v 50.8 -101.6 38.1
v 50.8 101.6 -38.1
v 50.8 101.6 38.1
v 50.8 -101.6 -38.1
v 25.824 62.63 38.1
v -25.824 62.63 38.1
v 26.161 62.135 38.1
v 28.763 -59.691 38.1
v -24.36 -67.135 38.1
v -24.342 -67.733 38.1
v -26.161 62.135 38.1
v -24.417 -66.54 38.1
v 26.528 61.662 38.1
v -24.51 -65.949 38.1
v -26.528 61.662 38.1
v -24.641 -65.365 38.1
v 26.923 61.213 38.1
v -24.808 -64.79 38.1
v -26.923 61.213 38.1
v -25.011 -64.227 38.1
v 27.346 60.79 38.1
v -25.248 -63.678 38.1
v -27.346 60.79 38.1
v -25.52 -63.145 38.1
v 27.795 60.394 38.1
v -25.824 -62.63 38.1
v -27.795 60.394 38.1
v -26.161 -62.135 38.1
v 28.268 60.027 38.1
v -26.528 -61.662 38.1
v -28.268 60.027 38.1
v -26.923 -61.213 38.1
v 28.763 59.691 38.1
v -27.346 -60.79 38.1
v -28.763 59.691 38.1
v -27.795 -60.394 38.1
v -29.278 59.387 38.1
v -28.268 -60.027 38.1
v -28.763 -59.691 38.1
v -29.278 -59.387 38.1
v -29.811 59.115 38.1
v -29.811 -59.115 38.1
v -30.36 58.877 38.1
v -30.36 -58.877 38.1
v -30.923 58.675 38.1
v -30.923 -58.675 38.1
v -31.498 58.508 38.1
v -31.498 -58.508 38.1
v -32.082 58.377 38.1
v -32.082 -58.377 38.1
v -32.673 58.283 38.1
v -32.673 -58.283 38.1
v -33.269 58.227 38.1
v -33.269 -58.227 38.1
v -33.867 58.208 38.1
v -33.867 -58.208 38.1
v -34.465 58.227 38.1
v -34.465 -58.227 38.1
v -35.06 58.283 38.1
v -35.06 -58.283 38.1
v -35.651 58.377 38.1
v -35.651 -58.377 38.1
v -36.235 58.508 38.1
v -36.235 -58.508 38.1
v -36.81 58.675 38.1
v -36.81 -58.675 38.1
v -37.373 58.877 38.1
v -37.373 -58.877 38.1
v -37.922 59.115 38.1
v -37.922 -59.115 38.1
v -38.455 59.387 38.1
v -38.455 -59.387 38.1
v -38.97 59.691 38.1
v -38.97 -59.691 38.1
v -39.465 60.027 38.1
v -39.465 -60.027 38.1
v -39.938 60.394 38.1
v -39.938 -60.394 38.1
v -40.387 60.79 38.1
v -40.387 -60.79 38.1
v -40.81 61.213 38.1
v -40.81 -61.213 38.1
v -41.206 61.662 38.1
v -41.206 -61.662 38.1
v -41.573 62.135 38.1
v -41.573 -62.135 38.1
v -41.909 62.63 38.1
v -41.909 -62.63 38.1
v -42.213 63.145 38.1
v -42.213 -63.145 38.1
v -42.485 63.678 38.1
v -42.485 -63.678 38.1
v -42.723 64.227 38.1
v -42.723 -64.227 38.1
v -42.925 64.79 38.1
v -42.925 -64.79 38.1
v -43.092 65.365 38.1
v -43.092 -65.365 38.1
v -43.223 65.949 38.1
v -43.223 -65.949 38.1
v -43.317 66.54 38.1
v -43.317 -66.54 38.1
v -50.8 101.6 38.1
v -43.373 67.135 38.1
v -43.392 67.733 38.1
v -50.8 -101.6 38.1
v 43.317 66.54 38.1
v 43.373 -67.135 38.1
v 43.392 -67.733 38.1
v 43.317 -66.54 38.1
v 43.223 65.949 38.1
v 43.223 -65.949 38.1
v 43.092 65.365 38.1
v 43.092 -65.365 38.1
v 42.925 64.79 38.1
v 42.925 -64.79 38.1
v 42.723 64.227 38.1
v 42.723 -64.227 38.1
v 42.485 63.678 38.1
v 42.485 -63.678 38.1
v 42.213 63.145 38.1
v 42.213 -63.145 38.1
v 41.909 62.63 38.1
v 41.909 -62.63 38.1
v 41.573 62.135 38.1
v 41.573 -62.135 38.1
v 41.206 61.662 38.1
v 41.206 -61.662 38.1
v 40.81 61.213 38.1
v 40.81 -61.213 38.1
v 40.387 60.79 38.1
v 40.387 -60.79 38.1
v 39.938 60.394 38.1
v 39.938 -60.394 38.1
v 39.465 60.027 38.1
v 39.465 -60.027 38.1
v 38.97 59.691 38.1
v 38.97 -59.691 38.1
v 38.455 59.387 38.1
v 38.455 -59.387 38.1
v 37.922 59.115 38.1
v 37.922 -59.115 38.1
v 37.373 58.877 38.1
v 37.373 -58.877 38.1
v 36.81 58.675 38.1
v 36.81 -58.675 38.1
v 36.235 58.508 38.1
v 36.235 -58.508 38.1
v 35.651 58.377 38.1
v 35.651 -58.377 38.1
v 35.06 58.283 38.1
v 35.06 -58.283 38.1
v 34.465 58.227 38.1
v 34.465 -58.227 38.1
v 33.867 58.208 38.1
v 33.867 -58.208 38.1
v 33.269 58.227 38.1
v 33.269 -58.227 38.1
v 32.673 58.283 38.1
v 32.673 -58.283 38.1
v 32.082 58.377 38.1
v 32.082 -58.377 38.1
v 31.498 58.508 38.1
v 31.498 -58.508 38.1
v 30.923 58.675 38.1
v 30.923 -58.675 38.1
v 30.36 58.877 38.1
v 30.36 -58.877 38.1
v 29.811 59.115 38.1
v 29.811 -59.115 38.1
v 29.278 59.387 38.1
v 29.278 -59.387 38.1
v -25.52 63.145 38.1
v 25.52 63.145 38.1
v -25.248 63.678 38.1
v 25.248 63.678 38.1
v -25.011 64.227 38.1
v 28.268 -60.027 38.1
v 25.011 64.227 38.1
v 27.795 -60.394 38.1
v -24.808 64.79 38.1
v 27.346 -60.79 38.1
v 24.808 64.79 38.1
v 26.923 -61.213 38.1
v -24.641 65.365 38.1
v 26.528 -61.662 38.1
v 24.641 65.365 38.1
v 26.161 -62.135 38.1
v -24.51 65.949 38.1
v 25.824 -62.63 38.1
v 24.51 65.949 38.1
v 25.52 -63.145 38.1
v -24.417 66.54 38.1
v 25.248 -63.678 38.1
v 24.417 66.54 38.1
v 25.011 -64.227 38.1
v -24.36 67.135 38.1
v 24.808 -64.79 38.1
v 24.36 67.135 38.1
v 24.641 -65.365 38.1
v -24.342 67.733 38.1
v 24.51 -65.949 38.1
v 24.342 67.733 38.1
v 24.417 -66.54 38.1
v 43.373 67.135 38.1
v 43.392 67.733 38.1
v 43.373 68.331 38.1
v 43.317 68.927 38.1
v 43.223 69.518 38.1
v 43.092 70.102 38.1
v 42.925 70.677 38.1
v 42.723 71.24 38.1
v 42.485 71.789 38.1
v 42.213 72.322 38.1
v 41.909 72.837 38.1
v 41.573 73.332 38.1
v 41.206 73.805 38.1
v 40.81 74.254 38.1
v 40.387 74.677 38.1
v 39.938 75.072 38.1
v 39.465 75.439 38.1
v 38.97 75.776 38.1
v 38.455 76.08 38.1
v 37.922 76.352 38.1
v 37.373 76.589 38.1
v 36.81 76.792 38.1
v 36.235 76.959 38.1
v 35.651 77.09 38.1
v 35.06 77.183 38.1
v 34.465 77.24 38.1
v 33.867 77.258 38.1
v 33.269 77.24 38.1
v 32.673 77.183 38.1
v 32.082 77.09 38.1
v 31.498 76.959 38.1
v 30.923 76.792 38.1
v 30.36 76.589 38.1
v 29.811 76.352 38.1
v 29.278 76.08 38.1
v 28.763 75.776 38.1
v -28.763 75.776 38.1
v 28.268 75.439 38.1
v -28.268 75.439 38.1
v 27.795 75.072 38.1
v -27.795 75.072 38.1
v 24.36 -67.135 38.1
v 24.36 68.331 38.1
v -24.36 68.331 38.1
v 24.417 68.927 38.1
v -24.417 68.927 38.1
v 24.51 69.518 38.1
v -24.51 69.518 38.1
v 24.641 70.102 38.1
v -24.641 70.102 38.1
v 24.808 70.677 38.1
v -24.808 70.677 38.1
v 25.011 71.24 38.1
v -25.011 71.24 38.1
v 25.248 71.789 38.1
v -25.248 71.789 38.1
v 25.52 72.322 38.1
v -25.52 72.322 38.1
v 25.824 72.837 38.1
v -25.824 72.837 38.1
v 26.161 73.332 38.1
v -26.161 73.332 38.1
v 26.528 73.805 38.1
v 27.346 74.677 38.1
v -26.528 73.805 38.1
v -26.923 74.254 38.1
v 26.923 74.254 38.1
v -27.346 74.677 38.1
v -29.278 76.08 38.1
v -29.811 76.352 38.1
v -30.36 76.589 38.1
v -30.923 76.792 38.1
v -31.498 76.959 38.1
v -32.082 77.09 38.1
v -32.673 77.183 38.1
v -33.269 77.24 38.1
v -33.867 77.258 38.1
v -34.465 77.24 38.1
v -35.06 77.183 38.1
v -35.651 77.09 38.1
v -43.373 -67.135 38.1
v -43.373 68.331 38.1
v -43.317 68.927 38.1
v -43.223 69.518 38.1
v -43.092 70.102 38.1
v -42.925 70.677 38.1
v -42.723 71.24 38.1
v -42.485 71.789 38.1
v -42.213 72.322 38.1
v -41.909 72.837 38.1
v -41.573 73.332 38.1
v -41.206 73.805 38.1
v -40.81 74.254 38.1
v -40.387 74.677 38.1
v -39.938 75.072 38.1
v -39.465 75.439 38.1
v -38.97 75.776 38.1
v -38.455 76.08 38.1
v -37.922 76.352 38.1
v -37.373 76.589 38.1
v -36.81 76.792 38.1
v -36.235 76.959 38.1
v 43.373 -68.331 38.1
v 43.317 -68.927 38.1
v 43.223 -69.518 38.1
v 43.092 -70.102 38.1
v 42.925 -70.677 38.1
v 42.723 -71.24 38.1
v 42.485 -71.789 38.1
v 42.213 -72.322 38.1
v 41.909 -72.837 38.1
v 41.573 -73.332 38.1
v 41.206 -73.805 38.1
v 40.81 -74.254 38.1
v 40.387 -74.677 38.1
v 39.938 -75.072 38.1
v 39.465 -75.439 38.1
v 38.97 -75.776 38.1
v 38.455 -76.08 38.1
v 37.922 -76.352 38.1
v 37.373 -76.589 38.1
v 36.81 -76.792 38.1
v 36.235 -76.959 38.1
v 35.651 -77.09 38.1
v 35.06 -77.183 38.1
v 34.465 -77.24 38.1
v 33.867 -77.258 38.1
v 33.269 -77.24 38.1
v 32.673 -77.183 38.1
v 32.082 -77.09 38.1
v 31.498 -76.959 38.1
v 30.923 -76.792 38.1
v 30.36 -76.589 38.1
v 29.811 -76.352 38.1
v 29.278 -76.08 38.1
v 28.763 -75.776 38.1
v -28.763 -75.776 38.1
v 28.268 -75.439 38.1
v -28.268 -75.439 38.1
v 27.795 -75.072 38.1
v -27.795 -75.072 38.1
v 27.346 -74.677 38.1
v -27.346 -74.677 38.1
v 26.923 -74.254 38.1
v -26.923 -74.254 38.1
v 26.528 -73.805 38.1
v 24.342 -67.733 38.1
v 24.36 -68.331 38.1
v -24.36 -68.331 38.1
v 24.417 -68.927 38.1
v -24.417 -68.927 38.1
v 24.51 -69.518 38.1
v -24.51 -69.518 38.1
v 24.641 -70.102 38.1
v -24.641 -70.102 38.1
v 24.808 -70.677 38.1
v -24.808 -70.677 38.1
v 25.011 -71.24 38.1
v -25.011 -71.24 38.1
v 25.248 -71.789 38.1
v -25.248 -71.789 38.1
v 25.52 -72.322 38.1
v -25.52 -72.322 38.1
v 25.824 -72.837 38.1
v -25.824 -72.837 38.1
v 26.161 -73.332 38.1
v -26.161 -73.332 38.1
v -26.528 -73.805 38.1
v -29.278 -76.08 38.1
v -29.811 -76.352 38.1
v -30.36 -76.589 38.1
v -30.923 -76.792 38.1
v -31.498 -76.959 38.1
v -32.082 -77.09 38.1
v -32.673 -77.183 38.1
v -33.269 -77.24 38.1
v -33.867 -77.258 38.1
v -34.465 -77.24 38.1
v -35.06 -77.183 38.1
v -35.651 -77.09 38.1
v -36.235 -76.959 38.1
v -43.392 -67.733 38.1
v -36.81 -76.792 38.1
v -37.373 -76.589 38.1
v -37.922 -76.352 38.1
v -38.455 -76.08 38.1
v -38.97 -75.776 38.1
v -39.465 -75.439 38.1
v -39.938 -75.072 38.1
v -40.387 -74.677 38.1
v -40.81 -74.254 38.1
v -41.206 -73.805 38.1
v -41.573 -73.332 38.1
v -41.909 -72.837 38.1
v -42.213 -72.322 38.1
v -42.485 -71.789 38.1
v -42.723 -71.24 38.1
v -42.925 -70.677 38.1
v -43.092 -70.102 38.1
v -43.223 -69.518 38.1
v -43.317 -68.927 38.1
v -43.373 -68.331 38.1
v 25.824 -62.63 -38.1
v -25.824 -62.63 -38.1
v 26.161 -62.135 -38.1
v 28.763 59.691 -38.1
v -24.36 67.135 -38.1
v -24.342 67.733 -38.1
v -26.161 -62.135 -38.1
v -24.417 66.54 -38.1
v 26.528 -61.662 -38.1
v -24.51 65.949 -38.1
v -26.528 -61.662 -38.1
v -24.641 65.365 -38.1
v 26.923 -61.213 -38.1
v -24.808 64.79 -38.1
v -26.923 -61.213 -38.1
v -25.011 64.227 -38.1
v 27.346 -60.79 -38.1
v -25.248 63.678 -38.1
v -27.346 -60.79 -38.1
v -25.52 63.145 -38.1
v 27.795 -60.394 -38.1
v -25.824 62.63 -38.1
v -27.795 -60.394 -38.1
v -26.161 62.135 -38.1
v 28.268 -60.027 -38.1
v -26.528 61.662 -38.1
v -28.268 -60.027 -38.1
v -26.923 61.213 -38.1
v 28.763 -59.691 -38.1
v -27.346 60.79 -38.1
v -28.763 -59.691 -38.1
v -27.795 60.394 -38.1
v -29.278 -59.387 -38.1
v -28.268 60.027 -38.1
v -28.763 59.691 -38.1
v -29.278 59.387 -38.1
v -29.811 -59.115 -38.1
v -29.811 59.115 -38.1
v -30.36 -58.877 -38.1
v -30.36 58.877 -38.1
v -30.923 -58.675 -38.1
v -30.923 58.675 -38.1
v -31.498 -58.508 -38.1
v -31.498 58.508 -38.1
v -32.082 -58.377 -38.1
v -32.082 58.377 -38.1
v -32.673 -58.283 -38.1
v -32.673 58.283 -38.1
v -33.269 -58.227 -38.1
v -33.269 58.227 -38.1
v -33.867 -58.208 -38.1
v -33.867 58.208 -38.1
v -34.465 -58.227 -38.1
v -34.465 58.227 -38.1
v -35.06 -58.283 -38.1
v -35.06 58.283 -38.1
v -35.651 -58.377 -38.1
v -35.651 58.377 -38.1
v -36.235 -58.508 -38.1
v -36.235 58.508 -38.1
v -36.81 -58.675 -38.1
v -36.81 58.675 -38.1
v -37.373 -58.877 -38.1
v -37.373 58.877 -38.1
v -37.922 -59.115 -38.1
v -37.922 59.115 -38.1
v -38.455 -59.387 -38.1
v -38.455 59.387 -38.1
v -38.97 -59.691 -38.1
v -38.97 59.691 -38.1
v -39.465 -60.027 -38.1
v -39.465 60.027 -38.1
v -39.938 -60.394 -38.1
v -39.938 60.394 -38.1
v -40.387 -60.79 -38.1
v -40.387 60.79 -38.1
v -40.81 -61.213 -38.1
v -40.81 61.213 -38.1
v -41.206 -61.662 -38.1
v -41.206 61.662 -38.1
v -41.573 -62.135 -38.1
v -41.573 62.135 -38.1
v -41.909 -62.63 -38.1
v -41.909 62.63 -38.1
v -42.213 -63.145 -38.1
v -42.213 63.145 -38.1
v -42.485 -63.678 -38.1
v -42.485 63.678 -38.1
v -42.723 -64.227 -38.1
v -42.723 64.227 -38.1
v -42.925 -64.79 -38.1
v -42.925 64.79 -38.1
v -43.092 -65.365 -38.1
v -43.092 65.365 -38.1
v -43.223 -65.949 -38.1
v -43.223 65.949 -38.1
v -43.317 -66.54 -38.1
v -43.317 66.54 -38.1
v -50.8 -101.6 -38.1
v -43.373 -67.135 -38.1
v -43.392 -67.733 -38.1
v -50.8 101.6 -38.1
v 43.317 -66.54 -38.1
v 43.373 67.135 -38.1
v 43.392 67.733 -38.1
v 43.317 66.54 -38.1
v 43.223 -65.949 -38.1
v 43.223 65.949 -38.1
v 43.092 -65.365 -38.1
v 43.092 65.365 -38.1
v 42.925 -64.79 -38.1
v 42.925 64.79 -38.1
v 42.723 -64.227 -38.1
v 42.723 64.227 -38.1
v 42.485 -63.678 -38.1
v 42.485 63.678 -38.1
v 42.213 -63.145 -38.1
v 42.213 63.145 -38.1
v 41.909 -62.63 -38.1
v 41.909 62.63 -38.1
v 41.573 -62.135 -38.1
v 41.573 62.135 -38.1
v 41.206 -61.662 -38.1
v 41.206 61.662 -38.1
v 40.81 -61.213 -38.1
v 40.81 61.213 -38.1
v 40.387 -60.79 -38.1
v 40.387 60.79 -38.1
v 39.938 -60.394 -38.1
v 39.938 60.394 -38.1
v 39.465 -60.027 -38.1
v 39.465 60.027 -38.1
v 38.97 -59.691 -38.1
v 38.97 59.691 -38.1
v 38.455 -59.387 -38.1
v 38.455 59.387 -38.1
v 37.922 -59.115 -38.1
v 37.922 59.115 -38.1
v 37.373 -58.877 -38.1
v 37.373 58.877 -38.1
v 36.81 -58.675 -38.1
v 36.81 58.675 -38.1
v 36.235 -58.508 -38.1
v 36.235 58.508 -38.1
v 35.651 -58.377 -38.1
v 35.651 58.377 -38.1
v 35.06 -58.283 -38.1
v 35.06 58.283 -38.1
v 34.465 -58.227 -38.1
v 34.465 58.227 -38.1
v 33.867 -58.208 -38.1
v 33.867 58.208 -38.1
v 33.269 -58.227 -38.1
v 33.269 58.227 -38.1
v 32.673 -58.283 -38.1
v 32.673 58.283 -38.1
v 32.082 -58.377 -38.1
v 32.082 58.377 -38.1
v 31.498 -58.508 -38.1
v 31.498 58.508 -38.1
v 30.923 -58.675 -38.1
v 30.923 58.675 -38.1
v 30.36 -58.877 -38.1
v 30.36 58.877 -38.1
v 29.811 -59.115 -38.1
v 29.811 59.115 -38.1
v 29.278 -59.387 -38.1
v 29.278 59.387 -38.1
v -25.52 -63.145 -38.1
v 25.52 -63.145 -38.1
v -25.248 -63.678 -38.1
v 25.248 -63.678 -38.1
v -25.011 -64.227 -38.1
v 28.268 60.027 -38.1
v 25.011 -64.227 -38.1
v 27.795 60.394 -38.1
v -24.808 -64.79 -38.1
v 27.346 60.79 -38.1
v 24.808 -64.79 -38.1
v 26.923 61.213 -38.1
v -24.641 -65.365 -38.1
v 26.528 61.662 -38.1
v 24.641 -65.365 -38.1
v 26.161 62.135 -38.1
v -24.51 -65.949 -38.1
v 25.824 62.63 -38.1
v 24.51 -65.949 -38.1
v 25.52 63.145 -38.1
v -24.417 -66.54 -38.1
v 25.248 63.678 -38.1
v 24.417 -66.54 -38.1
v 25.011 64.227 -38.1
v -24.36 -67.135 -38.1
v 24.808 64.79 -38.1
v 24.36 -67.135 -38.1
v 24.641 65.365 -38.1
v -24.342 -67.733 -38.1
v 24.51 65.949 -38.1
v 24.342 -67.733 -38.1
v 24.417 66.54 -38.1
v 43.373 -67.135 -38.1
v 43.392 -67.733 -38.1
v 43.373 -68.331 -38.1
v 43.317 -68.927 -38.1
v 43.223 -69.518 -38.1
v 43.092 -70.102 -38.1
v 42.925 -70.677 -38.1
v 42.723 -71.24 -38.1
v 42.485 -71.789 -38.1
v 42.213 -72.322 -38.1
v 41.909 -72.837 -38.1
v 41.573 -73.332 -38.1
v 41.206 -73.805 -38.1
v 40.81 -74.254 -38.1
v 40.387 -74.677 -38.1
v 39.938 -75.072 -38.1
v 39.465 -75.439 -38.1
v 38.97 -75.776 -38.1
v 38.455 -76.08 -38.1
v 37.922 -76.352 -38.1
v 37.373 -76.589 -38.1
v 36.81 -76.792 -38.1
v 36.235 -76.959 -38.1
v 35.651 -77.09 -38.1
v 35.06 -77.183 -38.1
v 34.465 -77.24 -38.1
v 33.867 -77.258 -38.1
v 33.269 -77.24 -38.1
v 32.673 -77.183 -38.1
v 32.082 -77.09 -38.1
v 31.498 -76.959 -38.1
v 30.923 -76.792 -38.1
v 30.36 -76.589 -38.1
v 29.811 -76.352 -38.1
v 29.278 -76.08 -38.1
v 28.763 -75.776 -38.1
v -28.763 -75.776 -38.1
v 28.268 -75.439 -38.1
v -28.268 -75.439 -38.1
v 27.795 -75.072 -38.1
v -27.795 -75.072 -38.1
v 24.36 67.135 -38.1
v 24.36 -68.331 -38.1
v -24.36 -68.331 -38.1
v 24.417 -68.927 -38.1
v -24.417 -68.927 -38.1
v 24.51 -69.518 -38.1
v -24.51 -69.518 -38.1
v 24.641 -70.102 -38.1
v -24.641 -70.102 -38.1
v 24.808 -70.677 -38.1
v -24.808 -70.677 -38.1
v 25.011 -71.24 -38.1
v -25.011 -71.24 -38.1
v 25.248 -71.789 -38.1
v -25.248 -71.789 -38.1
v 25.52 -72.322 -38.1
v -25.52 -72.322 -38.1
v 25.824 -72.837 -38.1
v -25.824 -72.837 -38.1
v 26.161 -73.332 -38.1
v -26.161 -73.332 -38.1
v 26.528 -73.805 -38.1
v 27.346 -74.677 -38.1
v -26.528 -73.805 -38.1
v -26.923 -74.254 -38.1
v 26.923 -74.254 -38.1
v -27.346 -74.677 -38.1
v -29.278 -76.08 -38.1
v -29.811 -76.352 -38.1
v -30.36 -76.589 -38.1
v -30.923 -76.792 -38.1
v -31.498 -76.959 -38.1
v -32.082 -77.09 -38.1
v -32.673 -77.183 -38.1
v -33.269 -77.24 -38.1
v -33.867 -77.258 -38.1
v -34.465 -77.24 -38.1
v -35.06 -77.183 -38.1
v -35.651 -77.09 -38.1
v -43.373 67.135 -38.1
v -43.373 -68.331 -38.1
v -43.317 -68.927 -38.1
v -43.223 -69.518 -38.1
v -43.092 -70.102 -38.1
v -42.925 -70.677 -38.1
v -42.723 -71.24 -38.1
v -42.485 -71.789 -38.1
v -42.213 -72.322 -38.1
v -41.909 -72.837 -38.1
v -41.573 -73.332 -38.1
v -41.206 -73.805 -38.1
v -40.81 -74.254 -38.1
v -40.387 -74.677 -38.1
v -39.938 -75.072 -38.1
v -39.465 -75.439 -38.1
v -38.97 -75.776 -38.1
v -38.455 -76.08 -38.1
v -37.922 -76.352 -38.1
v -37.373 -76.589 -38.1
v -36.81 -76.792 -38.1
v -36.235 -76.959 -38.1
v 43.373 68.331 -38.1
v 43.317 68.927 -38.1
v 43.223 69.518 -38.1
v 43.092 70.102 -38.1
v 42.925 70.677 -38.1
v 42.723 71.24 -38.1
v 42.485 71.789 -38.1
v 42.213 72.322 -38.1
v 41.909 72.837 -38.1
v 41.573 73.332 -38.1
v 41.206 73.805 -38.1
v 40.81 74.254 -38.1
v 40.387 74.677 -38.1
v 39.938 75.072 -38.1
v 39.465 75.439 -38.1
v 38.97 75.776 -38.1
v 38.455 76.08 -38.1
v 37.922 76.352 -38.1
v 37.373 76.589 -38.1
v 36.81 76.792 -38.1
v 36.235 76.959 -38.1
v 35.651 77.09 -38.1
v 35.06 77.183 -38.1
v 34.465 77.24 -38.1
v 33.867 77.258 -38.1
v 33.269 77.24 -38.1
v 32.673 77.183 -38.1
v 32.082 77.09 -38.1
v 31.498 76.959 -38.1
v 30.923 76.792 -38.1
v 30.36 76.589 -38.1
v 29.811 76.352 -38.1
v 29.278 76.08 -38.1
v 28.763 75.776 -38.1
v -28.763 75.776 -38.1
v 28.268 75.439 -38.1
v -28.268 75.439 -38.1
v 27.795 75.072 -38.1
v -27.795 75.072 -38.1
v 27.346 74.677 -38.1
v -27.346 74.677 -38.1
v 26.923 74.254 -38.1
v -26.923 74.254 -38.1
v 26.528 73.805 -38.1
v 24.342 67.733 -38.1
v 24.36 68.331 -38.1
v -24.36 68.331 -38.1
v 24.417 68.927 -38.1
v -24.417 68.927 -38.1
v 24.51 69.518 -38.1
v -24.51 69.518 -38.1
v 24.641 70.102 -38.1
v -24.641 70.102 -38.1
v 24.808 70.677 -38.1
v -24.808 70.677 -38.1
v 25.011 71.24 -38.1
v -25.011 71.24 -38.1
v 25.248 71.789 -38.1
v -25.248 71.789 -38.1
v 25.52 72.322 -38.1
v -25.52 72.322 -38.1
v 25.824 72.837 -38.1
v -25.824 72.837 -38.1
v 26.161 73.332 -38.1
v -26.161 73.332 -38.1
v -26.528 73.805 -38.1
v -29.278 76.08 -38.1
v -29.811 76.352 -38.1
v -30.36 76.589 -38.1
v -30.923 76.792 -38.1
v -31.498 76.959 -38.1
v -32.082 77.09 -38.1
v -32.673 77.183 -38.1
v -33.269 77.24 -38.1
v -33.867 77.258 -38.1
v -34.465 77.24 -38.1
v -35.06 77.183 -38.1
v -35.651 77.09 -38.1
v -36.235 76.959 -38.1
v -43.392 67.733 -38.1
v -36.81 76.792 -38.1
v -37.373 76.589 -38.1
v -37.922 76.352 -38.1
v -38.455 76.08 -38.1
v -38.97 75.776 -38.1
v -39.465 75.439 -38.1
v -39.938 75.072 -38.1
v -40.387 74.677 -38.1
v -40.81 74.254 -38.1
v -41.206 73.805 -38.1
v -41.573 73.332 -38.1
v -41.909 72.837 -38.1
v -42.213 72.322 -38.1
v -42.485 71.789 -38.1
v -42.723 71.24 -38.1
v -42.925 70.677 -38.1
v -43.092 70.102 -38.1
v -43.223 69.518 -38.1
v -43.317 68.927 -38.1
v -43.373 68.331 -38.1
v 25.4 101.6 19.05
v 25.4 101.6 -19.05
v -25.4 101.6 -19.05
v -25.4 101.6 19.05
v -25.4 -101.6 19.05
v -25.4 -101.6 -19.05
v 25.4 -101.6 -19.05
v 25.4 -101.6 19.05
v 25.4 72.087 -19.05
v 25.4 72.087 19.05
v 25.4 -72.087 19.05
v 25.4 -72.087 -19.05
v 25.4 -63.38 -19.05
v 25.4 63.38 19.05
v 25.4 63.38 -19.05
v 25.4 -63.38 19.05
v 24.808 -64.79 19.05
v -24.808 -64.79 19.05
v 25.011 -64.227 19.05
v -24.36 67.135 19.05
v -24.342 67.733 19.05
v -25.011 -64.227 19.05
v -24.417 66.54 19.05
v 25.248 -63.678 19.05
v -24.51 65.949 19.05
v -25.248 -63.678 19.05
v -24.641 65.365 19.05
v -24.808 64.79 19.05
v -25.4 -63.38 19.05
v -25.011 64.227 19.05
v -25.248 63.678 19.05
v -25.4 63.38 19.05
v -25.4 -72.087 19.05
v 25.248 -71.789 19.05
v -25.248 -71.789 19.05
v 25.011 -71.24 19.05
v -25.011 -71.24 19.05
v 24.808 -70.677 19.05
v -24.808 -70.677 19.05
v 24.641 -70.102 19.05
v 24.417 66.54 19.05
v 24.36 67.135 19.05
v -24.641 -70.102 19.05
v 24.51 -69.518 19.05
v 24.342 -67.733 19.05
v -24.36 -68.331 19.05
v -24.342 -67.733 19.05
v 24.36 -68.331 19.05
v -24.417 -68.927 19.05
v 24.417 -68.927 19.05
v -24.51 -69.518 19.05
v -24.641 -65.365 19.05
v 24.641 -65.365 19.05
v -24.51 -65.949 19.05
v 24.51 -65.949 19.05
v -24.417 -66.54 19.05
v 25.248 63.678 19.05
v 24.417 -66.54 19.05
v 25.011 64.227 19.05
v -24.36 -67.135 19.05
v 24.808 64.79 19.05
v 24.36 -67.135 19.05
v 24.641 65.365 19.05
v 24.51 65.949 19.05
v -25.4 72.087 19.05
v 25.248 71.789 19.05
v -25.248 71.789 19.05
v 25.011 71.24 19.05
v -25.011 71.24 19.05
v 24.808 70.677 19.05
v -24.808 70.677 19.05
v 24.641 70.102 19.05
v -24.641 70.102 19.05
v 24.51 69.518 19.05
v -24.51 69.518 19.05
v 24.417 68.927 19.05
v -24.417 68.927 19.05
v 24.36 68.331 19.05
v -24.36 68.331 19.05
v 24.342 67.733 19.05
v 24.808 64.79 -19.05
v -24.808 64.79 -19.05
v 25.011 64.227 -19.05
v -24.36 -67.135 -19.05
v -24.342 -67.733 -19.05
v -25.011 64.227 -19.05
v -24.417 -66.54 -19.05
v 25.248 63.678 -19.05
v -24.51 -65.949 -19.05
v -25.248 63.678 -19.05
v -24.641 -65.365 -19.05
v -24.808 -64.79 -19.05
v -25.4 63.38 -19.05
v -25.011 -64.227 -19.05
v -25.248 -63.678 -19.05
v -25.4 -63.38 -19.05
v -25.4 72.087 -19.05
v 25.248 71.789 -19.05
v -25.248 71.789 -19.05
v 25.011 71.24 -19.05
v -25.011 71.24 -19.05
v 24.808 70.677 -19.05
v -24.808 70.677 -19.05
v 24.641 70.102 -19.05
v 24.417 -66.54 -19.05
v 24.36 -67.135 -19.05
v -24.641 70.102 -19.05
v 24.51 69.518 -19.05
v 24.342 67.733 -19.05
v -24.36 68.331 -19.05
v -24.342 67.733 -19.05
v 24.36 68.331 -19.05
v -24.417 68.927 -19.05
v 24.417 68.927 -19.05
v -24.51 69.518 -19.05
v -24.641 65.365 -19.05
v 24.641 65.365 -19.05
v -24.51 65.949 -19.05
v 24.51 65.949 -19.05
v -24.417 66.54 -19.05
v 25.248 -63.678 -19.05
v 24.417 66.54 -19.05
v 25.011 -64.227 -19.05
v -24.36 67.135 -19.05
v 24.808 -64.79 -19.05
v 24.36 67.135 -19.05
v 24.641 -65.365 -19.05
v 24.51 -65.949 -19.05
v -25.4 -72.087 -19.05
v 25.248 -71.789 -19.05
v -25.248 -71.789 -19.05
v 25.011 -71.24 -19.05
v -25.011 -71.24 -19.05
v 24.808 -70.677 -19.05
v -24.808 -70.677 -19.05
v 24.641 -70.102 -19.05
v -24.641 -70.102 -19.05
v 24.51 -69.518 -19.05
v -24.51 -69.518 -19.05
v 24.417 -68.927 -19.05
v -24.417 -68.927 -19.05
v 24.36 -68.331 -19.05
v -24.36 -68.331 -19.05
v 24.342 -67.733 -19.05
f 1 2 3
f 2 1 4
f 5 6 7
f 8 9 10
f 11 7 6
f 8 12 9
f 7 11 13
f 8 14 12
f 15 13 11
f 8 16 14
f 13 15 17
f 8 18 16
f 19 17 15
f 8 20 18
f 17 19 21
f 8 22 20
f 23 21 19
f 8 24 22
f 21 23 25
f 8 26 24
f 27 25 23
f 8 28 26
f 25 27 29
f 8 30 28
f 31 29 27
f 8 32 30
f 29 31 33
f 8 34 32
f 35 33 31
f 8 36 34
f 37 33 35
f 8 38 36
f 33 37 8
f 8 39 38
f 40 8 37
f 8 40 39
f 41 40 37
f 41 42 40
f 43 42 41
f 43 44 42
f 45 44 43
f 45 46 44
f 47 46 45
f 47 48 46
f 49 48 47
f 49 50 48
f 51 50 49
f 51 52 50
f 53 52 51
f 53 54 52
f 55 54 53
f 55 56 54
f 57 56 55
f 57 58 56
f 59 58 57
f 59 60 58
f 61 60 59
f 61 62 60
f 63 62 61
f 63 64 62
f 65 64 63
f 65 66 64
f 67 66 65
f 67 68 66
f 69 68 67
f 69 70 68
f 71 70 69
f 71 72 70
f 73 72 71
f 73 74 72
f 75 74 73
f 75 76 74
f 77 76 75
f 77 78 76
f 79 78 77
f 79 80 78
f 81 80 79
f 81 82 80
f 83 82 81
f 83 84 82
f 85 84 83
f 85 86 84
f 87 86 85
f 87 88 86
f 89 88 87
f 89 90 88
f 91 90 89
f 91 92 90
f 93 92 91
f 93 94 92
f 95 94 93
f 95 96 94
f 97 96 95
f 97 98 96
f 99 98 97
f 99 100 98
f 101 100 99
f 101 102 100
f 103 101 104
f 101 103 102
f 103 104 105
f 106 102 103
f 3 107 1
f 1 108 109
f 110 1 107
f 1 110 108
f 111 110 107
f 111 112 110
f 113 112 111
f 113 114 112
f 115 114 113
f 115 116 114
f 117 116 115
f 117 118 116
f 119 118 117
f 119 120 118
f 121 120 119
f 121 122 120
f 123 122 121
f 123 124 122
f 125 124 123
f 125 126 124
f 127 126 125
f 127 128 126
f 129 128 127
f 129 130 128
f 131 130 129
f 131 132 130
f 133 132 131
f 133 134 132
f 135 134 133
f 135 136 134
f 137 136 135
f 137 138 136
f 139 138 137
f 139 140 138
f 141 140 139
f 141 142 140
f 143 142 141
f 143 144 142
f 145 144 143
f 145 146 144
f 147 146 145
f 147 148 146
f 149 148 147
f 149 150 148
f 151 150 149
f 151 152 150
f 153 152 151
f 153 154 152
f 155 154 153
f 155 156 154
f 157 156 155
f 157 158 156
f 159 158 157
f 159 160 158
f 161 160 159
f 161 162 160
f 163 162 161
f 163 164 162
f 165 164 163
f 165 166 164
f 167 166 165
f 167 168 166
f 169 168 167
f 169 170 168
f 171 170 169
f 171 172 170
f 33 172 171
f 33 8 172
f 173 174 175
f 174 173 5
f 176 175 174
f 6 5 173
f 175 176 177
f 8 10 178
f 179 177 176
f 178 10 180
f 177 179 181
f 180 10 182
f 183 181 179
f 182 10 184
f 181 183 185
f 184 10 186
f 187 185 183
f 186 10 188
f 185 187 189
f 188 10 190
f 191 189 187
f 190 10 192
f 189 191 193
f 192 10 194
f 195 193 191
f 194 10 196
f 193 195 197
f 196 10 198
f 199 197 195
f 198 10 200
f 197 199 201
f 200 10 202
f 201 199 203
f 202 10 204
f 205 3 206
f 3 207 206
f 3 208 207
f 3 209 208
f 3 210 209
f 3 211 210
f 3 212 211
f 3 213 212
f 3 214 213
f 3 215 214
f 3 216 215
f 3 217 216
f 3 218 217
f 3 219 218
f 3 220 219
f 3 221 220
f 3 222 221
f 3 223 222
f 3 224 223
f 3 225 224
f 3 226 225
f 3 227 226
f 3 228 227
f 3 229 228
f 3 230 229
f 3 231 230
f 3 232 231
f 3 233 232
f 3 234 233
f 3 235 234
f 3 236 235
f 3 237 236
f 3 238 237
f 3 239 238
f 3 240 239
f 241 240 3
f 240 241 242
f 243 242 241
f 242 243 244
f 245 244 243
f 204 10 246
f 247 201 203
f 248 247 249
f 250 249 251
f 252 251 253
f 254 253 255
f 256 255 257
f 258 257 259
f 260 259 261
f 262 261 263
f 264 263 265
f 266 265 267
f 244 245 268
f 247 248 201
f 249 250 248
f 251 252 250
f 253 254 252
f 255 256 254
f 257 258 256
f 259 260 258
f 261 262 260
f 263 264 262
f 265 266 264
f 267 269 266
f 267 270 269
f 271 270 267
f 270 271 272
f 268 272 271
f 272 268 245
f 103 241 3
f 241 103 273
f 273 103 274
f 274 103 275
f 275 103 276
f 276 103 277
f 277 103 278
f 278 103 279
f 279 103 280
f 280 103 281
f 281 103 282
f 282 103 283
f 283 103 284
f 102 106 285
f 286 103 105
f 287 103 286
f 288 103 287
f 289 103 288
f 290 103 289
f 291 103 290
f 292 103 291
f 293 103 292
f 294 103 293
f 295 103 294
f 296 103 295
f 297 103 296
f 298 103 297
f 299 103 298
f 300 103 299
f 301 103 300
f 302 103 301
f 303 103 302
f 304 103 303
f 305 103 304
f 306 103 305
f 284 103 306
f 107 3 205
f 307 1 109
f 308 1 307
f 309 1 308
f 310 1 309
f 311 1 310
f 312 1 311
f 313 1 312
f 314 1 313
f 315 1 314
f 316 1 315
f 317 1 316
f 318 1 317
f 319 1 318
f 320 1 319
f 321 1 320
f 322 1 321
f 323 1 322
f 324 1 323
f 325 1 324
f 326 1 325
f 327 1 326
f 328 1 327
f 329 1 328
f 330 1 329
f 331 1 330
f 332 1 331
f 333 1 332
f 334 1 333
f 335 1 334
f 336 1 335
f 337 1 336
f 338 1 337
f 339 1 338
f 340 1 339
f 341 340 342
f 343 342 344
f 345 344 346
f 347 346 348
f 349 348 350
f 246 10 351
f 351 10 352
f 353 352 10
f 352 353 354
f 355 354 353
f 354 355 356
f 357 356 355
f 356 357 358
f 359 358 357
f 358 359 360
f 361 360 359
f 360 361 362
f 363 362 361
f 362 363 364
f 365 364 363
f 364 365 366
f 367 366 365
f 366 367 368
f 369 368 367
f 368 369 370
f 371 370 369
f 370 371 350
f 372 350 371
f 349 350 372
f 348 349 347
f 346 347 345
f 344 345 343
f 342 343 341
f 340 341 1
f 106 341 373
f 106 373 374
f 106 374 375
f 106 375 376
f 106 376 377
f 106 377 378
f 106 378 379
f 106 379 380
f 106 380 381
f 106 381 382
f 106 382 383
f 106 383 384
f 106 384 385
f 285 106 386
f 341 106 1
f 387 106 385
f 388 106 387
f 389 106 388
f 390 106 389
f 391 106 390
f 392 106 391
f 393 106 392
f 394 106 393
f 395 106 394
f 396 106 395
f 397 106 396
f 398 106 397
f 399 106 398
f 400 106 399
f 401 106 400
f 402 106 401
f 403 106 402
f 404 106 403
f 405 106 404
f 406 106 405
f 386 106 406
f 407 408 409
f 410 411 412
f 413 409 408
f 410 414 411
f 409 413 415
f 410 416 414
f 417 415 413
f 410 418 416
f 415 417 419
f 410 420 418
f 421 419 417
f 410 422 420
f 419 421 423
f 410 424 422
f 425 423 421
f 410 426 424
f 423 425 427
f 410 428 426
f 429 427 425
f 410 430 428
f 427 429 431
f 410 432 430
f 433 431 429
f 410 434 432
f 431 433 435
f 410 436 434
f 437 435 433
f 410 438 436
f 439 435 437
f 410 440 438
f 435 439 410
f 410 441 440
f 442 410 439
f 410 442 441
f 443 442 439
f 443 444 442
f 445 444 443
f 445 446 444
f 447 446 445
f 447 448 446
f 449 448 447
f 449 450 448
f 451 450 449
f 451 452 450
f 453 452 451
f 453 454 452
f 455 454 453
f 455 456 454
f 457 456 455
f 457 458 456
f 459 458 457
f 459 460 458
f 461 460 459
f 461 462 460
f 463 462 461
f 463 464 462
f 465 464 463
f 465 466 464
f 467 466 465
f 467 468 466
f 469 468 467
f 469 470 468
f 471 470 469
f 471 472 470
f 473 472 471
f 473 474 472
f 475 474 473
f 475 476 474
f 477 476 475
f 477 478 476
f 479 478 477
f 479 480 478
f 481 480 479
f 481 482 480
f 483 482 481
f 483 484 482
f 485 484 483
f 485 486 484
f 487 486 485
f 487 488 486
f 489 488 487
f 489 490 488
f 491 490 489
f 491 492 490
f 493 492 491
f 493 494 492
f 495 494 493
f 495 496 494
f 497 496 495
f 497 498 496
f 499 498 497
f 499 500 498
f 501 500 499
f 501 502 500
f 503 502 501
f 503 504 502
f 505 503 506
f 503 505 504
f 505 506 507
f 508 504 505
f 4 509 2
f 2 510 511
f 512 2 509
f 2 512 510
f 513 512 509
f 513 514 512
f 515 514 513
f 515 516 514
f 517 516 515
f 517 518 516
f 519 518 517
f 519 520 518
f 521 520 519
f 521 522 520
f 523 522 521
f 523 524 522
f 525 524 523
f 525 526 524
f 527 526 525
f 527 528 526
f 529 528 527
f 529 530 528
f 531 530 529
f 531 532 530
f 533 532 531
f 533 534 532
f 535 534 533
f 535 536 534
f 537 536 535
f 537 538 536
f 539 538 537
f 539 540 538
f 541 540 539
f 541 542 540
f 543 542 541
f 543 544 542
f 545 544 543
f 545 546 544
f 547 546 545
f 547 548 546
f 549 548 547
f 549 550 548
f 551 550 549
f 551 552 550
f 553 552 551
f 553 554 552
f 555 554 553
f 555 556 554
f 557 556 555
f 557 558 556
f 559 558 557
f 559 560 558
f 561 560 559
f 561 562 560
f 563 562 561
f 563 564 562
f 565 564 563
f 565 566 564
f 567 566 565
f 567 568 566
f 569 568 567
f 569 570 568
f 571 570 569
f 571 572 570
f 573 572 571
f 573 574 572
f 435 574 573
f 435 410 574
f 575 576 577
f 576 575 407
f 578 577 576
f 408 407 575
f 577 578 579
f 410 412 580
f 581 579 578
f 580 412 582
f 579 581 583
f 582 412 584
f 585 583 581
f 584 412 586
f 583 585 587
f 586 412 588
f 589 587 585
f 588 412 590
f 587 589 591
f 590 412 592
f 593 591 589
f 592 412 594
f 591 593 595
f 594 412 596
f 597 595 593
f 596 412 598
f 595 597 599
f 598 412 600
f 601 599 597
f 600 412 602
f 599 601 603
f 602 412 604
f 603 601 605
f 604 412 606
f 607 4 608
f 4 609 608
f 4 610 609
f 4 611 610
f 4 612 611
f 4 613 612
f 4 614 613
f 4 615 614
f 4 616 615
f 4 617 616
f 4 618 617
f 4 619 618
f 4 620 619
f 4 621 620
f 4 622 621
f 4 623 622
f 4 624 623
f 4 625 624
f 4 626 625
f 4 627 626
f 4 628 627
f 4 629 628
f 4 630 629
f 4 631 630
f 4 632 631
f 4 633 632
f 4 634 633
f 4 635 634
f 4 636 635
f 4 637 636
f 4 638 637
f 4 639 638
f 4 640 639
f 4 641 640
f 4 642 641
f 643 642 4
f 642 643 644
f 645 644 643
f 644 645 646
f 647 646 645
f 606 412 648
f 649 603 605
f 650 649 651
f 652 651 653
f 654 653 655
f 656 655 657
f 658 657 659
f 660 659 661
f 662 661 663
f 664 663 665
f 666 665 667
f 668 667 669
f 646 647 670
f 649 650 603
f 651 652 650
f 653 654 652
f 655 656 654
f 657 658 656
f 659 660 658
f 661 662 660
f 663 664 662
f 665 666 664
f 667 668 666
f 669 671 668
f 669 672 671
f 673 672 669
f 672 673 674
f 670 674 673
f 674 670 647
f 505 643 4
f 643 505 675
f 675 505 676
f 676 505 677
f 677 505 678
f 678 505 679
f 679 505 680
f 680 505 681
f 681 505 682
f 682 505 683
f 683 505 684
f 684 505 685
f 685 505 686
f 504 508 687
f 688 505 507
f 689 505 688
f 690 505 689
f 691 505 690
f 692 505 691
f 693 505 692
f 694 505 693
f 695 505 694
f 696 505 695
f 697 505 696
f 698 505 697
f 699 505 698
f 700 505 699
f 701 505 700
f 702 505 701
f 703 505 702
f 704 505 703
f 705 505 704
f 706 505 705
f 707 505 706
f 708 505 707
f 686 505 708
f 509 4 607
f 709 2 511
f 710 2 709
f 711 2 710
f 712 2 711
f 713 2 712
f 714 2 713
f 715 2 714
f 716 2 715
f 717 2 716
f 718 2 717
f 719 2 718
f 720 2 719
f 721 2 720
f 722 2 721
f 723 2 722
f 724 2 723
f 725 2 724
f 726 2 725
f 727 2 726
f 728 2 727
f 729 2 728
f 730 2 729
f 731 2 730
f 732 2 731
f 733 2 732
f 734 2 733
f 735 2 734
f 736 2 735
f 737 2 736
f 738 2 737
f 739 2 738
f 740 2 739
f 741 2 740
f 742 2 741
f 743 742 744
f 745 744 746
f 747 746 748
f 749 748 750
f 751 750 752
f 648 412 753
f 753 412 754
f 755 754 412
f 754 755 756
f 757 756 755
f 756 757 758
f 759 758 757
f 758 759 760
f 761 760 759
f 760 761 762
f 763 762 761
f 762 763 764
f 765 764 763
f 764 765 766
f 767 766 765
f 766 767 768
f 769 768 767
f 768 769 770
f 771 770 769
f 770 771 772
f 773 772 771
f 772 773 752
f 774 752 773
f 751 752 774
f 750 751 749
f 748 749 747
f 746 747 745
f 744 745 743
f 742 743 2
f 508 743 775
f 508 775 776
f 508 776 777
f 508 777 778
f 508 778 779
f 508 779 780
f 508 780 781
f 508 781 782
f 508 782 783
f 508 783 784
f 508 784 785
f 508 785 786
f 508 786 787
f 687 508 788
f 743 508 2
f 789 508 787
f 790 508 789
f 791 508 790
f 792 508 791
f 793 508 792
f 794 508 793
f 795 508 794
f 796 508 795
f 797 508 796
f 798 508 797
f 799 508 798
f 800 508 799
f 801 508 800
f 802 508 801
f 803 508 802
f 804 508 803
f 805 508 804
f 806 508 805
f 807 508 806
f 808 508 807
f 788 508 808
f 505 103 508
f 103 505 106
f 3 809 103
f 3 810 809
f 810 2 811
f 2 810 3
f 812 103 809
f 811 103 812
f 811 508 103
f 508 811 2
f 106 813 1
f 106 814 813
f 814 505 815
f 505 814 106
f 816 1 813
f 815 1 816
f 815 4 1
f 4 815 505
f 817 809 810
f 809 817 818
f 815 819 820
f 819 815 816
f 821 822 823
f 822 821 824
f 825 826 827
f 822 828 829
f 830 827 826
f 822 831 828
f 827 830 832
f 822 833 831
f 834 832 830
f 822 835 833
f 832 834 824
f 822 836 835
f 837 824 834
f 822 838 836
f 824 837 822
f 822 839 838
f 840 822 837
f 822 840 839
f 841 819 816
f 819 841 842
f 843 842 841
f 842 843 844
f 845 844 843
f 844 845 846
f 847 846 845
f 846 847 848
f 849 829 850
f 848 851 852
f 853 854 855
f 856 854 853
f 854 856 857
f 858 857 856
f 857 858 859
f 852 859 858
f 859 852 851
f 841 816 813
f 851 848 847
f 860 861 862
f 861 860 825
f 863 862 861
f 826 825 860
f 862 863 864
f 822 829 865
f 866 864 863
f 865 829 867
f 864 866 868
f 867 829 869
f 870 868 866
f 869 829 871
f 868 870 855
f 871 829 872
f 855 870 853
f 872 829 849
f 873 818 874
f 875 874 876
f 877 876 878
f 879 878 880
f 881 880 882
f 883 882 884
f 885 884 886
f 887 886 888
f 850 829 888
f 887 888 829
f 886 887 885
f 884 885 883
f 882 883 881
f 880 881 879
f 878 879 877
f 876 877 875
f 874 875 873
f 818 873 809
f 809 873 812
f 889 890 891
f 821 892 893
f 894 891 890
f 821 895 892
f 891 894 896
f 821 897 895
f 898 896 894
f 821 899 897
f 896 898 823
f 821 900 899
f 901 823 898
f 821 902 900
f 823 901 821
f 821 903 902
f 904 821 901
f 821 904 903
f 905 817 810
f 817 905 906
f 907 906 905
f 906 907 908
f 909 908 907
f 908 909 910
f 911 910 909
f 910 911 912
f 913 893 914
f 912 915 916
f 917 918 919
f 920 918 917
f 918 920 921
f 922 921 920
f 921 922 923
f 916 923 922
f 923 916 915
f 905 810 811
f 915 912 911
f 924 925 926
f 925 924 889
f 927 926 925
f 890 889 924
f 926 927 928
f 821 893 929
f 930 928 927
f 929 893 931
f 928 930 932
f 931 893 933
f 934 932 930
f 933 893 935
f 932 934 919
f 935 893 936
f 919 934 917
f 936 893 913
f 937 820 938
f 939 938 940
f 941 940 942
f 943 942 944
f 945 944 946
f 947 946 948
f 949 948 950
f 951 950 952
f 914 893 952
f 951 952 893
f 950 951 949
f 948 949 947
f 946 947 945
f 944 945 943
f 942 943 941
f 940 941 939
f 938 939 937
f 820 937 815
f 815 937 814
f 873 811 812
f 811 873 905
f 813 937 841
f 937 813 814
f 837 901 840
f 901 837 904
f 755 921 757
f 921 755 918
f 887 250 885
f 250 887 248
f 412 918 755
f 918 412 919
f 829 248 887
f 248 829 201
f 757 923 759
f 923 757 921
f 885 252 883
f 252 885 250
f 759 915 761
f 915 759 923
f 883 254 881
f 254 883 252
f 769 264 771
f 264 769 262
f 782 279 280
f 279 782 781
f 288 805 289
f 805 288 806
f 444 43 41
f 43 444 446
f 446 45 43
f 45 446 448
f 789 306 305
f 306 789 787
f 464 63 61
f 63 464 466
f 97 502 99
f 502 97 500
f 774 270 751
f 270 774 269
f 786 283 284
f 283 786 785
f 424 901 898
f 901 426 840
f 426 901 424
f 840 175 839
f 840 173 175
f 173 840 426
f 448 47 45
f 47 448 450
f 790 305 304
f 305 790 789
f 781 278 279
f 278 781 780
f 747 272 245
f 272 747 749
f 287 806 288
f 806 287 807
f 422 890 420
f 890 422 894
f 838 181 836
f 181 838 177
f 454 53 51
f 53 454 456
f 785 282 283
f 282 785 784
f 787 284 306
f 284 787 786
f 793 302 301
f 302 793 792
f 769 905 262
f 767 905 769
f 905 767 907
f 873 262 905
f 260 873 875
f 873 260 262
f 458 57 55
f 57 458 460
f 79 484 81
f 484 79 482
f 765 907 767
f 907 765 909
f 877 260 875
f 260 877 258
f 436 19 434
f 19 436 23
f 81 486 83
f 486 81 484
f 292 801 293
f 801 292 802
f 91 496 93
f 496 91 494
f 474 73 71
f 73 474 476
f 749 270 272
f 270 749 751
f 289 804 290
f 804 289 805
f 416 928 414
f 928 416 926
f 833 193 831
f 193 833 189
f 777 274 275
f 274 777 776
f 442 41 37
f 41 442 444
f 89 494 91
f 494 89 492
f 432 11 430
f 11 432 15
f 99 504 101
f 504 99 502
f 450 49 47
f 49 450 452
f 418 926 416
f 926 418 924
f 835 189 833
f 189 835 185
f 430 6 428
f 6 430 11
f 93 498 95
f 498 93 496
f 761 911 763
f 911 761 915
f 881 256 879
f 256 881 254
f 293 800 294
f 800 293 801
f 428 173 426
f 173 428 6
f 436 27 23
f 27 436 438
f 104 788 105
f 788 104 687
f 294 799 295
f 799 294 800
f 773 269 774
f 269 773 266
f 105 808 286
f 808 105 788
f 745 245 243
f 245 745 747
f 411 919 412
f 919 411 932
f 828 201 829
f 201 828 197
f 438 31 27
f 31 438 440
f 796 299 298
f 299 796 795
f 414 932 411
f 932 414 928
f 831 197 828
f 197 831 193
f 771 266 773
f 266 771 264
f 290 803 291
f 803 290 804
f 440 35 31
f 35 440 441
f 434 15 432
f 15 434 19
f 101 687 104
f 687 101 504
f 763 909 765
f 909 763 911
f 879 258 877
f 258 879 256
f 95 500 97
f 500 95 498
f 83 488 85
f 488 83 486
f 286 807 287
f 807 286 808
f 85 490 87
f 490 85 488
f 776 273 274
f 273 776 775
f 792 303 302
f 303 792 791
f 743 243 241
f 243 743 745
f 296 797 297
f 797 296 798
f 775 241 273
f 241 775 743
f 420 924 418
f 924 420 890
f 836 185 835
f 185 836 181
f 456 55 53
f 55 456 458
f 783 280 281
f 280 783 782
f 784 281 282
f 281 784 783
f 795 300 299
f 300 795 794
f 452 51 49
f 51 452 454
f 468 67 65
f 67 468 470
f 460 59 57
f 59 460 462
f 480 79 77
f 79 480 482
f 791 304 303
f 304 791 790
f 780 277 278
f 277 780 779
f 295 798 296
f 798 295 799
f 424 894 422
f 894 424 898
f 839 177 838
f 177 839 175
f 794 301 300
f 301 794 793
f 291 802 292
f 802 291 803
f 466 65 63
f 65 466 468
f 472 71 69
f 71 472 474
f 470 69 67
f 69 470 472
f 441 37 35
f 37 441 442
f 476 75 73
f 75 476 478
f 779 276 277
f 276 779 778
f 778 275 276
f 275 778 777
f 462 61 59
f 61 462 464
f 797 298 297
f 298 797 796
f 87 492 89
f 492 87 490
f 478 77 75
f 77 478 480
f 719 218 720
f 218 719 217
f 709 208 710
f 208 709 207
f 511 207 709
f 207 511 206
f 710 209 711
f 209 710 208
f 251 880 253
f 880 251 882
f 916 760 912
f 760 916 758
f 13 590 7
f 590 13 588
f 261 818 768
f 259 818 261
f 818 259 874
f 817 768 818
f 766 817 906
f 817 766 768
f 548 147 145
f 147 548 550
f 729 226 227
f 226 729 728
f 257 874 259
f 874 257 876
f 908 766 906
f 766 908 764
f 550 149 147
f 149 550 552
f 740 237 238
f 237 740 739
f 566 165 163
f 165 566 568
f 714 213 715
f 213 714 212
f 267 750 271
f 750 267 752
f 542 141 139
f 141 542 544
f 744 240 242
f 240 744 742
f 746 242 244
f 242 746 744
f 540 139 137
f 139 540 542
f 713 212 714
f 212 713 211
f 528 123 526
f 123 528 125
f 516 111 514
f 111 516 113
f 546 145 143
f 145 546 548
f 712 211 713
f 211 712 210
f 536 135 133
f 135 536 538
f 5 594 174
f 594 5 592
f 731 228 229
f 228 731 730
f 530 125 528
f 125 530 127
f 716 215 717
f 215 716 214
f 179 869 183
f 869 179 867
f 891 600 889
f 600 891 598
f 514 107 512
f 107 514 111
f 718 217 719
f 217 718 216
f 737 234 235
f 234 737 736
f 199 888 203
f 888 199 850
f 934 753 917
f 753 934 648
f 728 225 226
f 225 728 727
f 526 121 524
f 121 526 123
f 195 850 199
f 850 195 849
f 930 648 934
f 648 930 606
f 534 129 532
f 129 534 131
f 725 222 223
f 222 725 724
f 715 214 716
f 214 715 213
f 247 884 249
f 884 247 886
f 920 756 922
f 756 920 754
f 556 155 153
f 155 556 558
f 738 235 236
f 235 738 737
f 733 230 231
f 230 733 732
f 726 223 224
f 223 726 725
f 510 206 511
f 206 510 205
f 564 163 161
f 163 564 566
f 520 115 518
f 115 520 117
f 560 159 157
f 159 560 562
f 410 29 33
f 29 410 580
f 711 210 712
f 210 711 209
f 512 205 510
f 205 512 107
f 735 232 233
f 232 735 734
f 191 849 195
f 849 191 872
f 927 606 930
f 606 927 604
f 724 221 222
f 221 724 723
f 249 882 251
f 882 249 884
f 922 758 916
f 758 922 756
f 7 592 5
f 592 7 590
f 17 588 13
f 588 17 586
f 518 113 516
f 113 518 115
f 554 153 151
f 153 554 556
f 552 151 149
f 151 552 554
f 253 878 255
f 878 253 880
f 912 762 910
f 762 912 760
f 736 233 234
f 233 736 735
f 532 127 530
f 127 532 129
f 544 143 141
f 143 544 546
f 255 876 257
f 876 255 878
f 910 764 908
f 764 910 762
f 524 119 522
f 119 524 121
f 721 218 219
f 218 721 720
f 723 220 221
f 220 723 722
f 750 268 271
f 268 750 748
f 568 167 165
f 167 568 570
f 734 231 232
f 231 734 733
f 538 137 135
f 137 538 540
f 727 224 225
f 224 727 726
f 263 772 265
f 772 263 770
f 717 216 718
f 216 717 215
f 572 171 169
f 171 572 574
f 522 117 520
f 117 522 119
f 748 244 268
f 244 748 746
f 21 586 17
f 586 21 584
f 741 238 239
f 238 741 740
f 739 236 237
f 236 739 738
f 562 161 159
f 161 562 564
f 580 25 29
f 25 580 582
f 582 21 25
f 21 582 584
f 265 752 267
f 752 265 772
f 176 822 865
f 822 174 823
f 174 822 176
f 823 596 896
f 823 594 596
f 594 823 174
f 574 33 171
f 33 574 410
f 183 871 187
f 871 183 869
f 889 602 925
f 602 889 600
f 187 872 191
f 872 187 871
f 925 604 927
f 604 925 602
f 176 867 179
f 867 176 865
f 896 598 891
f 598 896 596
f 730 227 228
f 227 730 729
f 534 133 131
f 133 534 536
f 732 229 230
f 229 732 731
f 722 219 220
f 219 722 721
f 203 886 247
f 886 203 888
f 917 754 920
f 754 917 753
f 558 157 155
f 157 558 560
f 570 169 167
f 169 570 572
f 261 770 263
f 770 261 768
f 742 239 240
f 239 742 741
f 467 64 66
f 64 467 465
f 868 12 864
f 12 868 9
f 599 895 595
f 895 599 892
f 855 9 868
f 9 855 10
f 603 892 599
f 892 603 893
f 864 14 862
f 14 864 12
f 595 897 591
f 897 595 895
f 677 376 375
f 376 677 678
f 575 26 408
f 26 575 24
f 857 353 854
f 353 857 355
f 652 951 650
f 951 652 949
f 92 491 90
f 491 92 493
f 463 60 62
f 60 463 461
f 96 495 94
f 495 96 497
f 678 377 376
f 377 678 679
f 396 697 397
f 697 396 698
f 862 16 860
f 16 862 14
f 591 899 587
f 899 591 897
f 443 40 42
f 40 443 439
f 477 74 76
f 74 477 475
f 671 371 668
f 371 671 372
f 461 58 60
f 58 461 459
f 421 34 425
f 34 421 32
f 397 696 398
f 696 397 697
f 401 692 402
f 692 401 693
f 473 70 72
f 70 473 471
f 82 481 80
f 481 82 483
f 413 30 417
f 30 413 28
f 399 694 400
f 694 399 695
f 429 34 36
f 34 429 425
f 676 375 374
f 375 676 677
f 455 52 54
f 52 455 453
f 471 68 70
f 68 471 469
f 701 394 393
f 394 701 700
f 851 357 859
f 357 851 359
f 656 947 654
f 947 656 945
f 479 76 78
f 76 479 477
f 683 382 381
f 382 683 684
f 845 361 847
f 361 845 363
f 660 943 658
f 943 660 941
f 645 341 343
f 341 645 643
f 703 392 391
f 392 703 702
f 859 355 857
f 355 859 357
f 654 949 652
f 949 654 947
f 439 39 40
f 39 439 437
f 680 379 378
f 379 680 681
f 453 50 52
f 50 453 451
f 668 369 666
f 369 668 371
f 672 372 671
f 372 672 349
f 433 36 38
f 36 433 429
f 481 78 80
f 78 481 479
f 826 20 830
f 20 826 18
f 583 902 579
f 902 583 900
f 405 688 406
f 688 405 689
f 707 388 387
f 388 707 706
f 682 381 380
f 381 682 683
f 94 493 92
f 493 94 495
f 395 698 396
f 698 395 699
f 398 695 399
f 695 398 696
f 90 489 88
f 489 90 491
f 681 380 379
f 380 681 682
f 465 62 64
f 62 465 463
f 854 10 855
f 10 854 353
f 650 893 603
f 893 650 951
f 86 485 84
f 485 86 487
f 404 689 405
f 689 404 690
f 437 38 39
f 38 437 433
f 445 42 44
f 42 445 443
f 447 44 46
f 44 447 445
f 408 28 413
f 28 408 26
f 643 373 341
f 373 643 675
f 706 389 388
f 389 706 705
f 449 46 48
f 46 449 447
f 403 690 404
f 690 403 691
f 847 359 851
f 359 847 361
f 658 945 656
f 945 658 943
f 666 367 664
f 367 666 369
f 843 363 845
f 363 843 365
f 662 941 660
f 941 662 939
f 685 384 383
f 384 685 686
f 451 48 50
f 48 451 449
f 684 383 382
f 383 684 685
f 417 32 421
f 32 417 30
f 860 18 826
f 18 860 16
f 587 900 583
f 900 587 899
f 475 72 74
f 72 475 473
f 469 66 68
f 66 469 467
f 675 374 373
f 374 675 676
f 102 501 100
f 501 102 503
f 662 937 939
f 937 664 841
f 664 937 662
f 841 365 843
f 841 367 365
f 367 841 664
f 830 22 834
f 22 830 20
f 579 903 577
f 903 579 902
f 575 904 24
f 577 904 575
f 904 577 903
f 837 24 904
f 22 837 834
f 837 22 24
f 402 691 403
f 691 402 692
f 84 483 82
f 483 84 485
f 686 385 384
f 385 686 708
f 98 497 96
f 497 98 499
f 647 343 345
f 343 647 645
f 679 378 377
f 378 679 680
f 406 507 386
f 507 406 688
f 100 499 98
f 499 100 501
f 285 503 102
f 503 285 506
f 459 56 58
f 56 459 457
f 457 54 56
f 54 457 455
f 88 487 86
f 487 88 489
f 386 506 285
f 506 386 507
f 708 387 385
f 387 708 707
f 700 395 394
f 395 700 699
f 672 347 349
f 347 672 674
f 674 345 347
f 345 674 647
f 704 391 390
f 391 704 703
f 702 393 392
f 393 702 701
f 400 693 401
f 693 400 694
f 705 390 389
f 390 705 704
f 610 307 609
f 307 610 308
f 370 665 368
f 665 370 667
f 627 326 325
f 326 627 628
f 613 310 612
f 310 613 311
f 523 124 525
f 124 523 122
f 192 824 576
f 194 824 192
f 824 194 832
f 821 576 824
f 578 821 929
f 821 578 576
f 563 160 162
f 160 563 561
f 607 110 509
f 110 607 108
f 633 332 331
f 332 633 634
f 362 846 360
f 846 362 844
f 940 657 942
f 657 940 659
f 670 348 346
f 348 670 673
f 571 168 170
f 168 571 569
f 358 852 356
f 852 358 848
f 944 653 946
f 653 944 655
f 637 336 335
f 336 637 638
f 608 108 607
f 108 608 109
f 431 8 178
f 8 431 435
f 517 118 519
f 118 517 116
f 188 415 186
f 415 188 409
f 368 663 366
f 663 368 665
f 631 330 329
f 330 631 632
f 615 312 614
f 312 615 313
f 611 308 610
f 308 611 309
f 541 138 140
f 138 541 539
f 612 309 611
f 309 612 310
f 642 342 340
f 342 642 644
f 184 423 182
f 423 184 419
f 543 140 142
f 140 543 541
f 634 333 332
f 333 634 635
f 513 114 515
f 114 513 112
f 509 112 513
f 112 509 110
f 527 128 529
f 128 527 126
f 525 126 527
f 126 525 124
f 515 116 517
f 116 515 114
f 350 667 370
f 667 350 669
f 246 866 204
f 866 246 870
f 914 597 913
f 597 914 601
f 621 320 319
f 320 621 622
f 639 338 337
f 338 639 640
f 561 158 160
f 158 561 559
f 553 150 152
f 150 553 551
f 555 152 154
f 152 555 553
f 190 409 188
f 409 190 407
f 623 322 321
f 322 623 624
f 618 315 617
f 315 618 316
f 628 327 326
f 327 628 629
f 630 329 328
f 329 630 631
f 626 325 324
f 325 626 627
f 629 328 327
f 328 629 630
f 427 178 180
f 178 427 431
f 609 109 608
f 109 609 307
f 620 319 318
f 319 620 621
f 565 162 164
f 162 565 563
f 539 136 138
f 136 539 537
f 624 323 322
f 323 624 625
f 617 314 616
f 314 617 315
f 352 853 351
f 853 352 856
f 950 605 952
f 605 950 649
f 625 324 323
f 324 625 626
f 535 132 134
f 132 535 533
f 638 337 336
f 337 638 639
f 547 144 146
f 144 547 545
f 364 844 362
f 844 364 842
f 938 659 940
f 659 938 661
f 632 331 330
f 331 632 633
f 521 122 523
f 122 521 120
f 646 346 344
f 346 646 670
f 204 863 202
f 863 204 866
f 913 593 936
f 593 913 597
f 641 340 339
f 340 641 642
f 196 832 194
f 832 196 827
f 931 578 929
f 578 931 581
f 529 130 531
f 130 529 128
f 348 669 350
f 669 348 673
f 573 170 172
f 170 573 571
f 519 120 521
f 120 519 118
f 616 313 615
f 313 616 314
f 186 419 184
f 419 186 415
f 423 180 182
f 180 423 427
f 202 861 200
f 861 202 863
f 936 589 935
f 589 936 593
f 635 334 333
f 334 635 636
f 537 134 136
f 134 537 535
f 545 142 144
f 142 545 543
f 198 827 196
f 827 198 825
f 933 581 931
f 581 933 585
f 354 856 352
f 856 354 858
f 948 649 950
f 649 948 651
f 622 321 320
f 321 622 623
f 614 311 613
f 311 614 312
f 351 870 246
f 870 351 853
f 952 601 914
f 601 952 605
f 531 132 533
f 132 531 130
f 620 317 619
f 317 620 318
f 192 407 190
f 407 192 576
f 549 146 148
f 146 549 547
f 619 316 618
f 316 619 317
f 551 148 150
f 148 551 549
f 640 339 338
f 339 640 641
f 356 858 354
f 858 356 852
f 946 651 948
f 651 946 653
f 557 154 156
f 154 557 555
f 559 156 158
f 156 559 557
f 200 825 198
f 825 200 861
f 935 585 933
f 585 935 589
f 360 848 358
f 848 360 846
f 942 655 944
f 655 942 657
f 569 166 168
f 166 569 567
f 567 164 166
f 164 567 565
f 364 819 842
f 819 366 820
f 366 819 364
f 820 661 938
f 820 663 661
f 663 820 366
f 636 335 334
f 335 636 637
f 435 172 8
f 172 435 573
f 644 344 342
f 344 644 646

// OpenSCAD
// File Path: src/hardware/univac_timber_latch.scad
// =========================================================================
// UNIVAC INDUSTRIAL SYSTEMS — HEAVY SOLID-STATE TIMBER INTERLOCK LATCH
// Designed for Direct Mounting onto Heavy Timber Barn Beams
// =========================================================================

$fn = 100;
inch = 25.4;

latch_body_w = 4.0 * inch;
latch_body_l = 8.0 * inch;
latch_body_h = 3.0 * inch;

module timber_latch_assembly() {
    difference() {
        // Solid heavy-gauge steel latch deadbolt receiver block
        cube([latch_body_w, latch_body_l, latch_body_h], center=true);
        
        // Central sliding channel for the heavy locking pin bolt
        cube([2.0*inch, latch_body_l + 10, 1.5*inch], center=true);
        
        // Heavy-duty timber lag bolt counter-sunk mounting holes
        translate([-latch_body_w/3, latch_body_l/3, 0]) cylinder(h=latch_body_h+2, r=0.375*inch, center=true);
        translate([latch_body_w/3, latch_body_l/3, 0])  cylinder(h=latch_body_h+2, r=0.375*inch, center=true);
        translate([-latch_body_w/3, -latch_body_l/3, 0]) cylinder(h=latch_body_h+2, r=0.375*inch, center=true);
        translate([latch_body_w/3, -latch_body_l/3, 0])  cylinder(h=latch_body_h+2, r=0.375*inch, center=true);
    }
}

color("Charcoal") timber_latch_assembly();
